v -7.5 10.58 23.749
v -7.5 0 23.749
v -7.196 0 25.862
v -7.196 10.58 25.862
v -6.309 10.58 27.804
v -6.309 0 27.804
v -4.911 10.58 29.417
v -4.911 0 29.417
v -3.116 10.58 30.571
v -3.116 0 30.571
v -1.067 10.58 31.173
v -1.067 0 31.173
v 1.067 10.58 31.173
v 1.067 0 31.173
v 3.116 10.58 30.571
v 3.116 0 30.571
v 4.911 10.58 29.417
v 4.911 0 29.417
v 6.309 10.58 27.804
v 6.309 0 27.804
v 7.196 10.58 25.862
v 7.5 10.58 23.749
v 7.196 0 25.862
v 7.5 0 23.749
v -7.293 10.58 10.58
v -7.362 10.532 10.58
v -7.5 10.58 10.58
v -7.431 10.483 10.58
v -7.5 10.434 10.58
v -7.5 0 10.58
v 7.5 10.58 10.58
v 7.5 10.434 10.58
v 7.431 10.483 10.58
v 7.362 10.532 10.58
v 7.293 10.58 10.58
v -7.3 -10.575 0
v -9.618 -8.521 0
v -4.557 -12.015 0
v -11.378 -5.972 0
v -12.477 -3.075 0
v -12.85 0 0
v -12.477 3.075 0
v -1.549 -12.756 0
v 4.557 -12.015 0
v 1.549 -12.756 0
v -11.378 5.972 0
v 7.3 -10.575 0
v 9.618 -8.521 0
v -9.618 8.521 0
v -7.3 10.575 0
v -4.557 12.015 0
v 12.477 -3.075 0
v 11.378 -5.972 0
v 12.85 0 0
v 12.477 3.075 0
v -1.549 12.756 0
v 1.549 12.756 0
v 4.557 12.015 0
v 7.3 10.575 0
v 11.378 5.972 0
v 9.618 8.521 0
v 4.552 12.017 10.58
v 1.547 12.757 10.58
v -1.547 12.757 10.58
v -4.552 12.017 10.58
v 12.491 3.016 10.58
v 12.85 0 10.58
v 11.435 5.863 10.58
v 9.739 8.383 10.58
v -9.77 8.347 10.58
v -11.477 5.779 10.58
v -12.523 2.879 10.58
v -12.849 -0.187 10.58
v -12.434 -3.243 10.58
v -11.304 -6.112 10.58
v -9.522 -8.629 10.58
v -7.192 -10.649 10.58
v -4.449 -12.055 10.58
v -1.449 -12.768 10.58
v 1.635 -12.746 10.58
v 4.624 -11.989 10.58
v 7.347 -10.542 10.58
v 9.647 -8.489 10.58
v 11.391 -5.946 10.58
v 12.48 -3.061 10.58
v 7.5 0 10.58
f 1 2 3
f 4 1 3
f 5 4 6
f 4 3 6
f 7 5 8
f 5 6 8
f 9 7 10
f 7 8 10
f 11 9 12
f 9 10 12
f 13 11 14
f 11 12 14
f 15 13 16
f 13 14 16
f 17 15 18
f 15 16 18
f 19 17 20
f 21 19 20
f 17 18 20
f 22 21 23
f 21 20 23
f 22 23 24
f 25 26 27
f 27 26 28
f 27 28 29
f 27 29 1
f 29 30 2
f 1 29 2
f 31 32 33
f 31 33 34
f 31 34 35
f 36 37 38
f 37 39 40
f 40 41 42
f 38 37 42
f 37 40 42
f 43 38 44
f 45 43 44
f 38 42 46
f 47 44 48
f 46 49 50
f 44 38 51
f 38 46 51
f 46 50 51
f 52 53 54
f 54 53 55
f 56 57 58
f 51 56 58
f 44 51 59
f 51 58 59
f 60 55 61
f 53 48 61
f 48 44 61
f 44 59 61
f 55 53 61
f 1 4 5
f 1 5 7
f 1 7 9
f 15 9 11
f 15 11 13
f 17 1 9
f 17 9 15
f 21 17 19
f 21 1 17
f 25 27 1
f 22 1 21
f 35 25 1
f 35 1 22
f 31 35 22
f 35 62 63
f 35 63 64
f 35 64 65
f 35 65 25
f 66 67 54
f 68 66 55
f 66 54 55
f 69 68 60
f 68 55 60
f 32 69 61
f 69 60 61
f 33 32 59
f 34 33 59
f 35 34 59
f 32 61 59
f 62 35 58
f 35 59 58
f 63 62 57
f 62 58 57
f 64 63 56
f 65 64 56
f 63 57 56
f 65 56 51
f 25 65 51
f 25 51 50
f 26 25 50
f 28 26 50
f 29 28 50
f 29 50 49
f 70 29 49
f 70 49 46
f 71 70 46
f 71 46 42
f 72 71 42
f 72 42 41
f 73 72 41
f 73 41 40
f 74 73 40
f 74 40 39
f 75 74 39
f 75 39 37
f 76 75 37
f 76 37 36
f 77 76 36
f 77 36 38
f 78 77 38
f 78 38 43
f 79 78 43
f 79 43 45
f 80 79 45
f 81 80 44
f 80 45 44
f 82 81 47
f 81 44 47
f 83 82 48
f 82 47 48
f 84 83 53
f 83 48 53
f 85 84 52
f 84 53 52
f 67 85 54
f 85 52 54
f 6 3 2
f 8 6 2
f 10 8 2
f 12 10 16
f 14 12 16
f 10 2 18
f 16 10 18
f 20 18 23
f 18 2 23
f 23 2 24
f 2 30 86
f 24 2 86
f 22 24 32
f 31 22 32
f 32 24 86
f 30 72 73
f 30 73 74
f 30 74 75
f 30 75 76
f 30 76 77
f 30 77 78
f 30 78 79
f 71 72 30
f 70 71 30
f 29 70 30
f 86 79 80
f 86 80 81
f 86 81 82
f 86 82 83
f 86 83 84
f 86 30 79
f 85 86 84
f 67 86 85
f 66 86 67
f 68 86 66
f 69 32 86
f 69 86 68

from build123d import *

# Parameters (mm, degrees)
SKETCH1_R           = 12.85
BOSS_EXTRUDE5_DEPTH = 10.58
SKETCH4_R           = 7.5
SKETCH4_R_2         = 4.5
BOSS_EXTRUDE6_DEPTH = 10.58


with BuildPart() as part:
    # Sketch1 → Boss-Extrude5 (new body)
    with BuildSketch(Plane.XY):
        Circle(SKETCH1_R)
    extrude(amount=BOSS_EXTRUDE5_DEPTH)

    # Sketch4 → Boss-Extrude6 (add)
    with BuildSketch(Plane(origin=(0, 0, 0), x_dir=(1, 0, 0), z_dir=(0, 1, 0))):
        with BuildLine():
            Line((-7.5, -10.58), (-7.5, -23.749253103))
            ThreePointArc((-7.5, -23.749253103), (0, -16.249253103), (7.5, -23.749253103))
            Line((7.5, -23.749253103), (7.5, -10.58))
            Line((7.5, -10.58), (-7.5, -10.58))
        make_face()
        with Locations((0, -23.749253103)):
            Circle(SKETCH4_R)
        with Locations((0, -23.749253103)):
            Circle(SKETCH4_R_2, mode=Mode.SUBTRACT)
        with Locations((0, -23.749253103)):
            Circle(SKETCH4_R_2)
    extrude(amount=BOSS_EXTRUDE6_DEPTH)


solid = part.part
